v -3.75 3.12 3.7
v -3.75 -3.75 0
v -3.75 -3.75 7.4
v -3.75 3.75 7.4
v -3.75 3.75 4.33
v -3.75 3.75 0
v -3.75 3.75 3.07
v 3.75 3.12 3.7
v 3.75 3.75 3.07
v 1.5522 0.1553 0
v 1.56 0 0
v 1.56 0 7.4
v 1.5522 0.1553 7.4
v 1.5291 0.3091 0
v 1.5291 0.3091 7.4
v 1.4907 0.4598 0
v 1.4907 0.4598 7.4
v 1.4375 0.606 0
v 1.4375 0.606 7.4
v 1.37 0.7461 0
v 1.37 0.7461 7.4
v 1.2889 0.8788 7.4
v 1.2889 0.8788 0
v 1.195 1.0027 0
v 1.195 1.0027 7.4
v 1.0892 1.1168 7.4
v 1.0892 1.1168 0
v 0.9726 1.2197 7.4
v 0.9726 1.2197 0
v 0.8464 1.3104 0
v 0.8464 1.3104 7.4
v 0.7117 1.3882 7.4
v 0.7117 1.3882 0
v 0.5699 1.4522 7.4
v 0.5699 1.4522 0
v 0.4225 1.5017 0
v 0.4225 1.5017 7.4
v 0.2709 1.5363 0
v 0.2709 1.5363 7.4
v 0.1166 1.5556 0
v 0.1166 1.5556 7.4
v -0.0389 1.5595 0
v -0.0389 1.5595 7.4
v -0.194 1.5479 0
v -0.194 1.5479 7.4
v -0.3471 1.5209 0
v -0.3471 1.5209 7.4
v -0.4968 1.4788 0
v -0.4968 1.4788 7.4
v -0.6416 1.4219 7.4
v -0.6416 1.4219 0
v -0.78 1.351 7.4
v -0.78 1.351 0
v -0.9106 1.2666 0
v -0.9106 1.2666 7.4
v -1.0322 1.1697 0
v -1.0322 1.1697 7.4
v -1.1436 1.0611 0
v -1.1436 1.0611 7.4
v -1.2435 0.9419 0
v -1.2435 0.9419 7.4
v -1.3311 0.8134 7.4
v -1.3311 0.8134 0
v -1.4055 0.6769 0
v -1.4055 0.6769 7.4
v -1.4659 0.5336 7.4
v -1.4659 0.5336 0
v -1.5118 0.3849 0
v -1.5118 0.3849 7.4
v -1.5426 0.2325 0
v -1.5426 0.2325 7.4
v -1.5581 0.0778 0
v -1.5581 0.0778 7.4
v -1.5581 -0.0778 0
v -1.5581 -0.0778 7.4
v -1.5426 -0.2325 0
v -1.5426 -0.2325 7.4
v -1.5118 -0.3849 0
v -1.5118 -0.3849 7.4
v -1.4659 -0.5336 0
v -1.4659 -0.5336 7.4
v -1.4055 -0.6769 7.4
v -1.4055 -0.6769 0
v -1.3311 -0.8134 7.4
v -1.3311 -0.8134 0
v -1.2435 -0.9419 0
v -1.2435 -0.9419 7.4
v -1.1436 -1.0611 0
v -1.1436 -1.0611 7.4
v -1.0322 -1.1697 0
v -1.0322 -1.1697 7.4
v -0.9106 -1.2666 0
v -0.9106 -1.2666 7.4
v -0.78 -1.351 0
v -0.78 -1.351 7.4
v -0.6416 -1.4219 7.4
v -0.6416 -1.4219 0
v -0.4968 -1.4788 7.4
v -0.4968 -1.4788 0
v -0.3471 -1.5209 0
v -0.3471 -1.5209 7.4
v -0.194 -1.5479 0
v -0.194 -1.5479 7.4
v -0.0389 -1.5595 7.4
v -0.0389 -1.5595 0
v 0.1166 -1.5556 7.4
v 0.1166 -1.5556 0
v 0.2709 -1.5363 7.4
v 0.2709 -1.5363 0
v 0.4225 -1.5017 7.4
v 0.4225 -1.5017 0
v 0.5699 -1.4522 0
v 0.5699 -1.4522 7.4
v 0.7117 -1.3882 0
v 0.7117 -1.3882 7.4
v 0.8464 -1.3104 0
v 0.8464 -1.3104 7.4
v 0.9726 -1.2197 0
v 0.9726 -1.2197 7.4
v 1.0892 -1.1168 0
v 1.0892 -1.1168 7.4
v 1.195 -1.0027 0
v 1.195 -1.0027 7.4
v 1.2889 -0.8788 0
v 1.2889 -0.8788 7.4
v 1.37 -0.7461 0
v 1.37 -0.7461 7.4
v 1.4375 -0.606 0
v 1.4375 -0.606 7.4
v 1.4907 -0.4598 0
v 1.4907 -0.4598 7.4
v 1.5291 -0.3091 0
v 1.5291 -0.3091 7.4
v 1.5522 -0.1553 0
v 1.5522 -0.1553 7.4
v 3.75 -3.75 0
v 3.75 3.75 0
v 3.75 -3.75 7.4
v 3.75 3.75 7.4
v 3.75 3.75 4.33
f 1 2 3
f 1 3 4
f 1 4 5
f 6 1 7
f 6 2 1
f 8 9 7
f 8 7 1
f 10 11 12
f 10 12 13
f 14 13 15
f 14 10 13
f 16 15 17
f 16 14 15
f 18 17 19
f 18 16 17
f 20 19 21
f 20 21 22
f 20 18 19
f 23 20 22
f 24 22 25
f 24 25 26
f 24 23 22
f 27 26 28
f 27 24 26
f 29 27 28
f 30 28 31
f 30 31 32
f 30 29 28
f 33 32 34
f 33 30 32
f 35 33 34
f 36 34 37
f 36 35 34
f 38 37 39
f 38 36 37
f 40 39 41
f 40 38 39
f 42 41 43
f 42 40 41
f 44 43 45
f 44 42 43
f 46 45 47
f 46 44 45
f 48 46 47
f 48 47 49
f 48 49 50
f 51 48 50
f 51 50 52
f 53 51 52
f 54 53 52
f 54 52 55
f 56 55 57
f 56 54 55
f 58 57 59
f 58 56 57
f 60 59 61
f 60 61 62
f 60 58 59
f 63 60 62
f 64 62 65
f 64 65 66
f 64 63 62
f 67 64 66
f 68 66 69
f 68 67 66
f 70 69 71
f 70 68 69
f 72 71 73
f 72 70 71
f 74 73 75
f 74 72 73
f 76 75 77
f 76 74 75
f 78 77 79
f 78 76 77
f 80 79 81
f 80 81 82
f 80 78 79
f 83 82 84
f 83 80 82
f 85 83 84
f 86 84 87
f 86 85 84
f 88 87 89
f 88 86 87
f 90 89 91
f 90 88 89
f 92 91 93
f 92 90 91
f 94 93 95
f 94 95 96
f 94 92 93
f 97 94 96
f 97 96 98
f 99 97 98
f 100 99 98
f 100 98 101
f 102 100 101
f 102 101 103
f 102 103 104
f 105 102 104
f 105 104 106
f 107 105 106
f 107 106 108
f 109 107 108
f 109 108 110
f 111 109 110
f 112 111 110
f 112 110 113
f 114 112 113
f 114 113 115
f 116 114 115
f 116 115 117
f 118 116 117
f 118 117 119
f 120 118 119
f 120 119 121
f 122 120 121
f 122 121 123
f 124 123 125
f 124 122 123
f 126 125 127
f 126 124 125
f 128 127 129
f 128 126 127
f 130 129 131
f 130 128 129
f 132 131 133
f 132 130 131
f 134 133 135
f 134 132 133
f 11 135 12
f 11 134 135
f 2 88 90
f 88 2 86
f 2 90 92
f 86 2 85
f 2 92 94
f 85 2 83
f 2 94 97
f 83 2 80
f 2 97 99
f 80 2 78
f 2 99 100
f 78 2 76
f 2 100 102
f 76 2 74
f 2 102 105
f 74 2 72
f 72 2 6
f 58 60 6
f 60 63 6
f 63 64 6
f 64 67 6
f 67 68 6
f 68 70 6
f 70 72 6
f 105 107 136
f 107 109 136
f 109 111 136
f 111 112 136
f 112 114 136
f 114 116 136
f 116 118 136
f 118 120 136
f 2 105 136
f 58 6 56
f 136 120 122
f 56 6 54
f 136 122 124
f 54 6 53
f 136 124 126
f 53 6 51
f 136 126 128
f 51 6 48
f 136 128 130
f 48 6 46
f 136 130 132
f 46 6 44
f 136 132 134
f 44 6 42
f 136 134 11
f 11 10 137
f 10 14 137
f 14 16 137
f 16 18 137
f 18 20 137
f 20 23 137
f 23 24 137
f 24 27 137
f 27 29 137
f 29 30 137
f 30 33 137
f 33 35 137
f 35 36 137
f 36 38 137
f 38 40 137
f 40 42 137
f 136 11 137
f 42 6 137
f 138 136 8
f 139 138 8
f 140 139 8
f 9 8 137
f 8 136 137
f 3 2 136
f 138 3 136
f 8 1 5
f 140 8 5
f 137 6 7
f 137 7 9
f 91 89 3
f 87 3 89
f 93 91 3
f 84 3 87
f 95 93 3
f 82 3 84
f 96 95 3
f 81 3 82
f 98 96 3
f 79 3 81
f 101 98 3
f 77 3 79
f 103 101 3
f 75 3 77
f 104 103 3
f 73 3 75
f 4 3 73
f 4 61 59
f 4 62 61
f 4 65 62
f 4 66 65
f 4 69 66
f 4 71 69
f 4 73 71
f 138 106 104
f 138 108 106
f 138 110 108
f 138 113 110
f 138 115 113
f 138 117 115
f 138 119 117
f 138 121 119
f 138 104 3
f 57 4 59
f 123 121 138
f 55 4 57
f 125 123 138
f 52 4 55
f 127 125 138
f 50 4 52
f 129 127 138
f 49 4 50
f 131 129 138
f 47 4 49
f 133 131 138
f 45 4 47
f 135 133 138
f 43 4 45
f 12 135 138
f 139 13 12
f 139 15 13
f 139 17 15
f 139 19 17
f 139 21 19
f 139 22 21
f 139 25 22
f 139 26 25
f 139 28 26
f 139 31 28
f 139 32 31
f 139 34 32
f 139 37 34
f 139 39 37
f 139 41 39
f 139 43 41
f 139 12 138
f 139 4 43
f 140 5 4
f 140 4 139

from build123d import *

# Parameters (mm, degrees)
SKETCH1_W           = 7.5
SKETCH1_H           = 7.5
SKETCH1_R           = 1.56
BOSS_EXTRUDE1_DEPTH = 7.4
CUT_EXTRUDE1_DEPTH  = 8.5


with BuildPart() as part:
    # Sketch1 → Boss-Extrude1 (new body)
    with BuildSketch(Plane.XY):
        Rectangle(SKETCH1_W, SKETCH1_H)
        Circle(SKETCH1_R, mode=Mode.SUBTRACT)
    extrude(amount=BOSS_EXTRUDE1_DEPTH)

    # Sketch2 → Cut-Extrude1 (cut, through all)
    with BuildSketch(Plane(origin=(3.75, 0, 0), x_dir=(0, 0, -1), z_dir=(1, 0, 0))):
        Polygon((-3.7, 3.12), (-4.33, 3.75), (-3.07, 3.75), align=None)
    extrude(amount=-CUT_EXTRUDE1_DEPTH, mode=Mode.SUBTRACT)


solid = part.part
